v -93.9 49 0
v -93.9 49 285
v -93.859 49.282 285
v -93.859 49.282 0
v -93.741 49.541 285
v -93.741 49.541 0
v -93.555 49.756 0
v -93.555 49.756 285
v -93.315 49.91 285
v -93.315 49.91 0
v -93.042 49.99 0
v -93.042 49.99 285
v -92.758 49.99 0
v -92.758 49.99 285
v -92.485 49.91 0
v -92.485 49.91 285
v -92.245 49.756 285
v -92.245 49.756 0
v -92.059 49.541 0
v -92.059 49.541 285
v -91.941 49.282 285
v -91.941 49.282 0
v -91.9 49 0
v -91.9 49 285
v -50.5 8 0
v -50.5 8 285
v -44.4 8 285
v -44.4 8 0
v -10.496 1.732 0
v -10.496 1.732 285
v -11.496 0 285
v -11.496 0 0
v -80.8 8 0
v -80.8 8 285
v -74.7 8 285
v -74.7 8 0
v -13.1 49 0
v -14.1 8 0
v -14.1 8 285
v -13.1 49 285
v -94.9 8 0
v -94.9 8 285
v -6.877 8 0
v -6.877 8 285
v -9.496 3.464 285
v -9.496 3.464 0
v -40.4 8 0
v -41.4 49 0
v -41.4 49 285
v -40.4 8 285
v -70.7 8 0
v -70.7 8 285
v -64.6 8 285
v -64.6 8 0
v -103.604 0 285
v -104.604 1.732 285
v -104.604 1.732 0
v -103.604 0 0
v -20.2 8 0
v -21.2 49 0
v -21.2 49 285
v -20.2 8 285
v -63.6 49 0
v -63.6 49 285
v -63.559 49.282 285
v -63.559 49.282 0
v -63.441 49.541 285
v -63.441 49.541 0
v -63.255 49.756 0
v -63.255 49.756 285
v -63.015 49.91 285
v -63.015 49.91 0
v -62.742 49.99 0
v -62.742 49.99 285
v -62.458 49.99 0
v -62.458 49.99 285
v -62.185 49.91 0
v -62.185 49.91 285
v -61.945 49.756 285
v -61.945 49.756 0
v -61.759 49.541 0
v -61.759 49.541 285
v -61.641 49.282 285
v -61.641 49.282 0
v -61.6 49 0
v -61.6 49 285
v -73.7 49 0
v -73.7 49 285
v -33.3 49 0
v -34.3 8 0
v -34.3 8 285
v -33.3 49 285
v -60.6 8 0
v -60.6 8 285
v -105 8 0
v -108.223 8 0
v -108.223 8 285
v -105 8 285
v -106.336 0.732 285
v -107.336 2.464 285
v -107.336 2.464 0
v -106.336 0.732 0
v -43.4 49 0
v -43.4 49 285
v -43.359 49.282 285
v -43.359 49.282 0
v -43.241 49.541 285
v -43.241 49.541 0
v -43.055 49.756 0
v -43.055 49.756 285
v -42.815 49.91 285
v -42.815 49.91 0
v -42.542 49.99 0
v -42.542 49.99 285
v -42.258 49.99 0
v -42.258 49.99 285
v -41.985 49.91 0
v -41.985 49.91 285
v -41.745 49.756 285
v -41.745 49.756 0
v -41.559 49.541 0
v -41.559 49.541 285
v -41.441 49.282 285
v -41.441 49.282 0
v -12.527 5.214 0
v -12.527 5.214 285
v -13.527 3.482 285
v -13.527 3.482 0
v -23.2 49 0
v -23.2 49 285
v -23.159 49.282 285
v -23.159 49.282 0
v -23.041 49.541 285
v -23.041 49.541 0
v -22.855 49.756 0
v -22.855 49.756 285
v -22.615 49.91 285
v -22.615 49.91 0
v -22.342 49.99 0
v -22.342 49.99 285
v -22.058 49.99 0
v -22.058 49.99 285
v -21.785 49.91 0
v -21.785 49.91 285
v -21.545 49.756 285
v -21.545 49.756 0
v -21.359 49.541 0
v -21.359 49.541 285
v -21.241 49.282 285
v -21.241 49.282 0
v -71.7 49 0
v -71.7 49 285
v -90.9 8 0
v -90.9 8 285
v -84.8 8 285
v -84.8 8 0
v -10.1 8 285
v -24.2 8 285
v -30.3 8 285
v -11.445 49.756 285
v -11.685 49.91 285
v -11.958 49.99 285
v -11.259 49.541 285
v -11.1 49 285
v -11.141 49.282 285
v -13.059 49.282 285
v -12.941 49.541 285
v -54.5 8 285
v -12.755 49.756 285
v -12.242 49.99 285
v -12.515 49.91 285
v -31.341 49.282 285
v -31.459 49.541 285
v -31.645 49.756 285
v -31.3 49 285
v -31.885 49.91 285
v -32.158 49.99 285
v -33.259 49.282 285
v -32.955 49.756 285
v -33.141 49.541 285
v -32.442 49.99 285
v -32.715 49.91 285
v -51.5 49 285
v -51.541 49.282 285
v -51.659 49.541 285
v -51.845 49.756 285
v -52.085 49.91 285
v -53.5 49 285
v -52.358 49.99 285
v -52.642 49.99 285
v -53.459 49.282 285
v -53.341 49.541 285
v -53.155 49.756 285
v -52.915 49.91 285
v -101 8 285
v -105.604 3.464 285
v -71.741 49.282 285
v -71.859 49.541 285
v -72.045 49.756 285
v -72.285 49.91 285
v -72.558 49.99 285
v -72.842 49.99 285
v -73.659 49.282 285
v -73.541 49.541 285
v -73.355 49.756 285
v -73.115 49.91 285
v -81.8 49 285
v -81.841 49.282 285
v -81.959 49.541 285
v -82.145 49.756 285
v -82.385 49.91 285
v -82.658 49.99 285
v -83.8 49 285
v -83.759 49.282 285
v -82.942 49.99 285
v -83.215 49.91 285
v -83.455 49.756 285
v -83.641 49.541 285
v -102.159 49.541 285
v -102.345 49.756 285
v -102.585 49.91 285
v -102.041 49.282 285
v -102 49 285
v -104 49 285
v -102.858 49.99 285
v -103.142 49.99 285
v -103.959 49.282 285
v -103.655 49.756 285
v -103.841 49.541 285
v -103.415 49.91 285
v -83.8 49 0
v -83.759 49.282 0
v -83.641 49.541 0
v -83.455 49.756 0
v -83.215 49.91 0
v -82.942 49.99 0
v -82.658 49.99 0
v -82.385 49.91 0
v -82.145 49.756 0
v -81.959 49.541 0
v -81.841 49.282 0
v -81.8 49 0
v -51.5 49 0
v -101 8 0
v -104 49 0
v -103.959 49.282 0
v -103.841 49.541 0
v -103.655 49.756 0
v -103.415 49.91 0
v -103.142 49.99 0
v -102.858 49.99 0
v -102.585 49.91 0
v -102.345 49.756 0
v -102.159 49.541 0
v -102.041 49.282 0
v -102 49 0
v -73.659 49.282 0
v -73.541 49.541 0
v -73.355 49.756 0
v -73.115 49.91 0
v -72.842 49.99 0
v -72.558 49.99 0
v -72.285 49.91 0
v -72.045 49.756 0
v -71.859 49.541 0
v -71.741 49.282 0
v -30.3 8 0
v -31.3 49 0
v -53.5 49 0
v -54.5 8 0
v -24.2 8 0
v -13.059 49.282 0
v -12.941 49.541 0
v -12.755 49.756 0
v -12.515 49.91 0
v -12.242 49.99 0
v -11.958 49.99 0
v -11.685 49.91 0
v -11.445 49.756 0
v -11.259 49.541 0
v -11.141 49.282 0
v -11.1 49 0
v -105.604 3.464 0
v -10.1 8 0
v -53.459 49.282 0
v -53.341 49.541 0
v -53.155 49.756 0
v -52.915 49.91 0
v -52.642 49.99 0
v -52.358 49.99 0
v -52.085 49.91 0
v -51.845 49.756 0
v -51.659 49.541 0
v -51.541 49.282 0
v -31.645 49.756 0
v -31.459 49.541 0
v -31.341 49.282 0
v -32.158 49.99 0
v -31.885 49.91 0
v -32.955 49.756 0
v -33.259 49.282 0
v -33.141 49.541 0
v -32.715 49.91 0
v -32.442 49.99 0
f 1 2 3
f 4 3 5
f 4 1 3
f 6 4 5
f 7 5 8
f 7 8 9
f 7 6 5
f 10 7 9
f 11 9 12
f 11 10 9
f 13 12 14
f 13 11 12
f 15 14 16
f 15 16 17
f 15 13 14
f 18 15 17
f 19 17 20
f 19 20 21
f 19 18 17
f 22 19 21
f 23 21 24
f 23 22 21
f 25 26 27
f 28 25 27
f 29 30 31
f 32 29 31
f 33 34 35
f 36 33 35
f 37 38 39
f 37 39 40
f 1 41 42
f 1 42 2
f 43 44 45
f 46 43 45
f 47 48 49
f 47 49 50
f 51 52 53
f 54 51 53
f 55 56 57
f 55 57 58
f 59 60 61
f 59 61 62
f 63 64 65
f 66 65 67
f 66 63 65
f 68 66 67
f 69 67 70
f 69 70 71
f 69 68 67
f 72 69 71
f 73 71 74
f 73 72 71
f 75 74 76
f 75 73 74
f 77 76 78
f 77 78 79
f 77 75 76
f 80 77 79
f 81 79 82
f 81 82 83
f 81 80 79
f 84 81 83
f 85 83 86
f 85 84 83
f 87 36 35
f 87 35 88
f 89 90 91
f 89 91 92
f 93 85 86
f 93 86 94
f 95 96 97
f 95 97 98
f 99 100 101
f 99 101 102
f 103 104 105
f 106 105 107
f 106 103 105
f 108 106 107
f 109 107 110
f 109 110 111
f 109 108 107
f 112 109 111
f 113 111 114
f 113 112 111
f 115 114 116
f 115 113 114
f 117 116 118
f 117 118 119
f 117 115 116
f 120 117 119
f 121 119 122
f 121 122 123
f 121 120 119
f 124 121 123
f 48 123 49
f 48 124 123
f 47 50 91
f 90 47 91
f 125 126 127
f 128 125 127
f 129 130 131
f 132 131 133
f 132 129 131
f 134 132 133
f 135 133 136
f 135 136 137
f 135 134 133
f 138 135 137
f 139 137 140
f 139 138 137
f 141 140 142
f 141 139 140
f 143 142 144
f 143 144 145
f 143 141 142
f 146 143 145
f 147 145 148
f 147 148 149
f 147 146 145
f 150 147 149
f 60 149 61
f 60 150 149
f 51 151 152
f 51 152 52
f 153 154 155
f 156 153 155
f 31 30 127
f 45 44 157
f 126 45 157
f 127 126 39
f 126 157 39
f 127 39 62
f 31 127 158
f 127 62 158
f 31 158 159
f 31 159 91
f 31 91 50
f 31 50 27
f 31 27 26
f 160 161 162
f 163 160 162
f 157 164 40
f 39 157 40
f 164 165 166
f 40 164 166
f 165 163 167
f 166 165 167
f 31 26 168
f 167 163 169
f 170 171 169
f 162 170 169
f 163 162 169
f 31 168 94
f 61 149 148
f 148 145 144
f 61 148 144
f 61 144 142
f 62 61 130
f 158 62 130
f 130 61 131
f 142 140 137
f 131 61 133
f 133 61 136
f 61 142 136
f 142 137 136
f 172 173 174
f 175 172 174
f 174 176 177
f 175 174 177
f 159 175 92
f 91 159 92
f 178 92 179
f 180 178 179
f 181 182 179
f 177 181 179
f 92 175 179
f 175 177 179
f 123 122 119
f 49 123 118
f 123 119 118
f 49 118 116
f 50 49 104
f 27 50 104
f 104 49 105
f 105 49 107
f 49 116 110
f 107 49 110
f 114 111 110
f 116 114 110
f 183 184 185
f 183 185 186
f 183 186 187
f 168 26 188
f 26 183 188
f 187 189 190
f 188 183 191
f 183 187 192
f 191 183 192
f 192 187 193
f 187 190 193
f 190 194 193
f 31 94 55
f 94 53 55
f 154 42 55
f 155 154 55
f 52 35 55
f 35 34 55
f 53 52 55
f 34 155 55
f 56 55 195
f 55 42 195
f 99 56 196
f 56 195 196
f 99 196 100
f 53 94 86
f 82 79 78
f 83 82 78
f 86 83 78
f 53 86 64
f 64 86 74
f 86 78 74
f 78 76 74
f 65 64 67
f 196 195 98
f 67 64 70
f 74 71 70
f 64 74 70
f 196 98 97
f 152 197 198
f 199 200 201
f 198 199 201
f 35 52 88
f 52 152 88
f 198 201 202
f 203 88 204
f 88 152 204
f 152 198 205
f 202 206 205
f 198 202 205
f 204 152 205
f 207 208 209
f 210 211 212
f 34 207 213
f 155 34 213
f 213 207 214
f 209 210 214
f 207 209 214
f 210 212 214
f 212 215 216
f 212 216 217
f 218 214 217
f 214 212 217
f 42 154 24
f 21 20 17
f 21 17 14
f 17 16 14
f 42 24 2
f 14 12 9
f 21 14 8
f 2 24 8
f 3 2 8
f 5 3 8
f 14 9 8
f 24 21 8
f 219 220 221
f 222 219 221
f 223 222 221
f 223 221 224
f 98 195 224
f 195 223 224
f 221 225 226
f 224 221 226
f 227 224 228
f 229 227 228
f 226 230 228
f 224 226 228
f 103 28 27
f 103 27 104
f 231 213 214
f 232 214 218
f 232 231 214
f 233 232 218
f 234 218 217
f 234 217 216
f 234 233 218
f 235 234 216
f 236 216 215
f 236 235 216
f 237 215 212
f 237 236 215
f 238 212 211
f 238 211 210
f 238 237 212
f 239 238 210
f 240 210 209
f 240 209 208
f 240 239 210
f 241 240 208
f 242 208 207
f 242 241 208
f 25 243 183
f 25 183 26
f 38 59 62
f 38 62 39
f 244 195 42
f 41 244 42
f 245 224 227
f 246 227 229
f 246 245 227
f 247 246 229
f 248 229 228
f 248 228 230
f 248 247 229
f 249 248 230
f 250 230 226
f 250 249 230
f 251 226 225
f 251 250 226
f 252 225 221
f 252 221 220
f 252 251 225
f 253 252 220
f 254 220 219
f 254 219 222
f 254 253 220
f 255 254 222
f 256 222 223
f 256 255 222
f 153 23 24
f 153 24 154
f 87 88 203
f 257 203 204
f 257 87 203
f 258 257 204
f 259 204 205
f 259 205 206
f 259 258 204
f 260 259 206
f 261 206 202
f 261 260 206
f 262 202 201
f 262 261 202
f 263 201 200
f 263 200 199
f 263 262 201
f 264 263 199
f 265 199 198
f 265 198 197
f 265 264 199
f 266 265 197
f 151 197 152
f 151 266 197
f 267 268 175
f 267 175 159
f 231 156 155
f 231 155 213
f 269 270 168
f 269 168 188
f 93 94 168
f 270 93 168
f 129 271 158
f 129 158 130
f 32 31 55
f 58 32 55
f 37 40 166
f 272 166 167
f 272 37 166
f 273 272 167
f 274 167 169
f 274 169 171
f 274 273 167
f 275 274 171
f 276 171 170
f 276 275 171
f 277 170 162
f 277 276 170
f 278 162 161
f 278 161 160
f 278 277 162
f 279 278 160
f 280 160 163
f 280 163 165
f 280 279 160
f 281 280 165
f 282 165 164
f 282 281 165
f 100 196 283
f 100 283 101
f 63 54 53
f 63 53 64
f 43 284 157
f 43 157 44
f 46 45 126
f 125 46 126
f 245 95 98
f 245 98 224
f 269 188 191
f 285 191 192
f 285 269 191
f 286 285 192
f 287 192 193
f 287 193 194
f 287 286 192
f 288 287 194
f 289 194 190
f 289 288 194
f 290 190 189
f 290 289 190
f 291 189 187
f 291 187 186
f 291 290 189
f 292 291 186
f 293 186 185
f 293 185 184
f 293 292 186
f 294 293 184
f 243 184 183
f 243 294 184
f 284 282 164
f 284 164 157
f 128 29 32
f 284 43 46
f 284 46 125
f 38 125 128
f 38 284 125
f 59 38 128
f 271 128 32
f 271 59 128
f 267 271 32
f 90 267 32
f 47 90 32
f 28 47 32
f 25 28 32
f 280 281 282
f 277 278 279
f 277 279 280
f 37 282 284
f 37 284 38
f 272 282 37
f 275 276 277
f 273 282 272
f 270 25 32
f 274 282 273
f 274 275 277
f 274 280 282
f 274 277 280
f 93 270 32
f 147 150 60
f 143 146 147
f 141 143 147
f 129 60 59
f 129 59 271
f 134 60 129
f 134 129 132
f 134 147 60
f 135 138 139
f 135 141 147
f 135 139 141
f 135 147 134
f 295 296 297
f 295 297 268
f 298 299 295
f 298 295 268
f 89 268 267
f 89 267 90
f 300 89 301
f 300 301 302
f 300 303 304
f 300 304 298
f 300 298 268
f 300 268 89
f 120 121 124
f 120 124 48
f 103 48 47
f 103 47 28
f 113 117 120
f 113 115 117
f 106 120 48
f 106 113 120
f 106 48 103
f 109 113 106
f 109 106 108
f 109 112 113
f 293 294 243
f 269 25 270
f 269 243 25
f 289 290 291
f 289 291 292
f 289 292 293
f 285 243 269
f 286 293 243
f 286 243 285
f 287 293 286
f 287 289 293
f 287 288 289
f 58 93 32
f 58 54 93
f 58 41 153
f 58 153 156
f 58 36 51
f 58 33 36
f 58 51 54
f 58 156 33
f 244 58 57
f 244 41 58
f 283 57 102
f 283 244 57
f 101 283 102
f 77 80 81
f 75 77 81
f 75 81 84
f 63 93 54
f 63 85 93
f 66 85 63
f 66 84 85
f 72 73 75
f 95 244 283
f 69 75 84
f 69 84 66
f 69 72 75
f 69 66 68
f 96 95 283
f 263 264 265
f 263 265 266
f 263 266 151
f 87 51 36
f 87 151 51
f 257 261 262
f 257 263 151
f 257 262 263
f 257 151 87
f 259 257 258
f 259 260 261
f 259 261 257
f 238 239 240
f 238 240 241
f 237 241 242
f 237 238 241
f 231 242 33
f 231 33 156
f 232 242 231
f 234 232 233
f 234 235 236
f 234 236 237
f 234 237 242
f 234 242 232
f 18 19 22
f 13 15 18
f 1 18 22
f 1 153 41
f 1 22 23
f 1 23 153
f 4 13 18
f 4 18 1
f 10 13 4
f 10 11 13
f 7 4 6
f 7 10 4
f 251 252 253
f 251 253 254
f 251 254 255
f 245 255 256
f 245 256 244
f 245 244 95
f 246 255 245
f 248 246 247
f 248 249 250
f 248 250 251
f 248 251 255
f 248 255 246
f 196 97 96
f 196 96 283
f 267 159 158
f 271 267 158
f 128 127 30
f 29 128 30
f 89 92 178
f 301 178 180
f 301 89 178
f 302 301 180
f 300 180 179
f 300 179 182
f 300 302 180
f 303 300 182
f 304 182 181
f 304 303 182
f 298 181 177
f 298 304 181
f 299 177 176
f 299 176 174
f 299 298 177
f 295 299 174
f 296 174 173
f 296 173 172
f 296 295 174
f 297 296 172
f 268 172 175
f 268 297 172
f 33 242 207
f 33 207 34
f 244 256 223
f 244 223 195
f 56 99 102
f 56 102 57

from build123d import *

# Parameters (mm, degrees)
RESSALTO_EXTRUS_O1_DEPTH   = 285
CORTE_EXTRUS_O1_DEPTH      = 1
CORTE_EXTRUS_O1_DEPTH_BACK = 286


with BuildPart() as part:
    # Esboço1 → Ressalto-extrusão1 (new body)
    with BuildSketch(Plane.XY):
        with BuildLine():
            Line((0, 0), (-115.1, 0))
            Line((-115.1, 0), (-115.1, 8))
            Line((-115.1, 8), (-114.1, 49))
            ThreePointArc((-114.1, 49), (-113.1, 50), (-112.1, 49))
            Line((-112.1, 49), (-111.1, 8))
            Line((-111.1, 8), (-105, 8))
            Line((-105, 8), (-104, 49))
            ThreePointArc((-104, 49), (-103, 50), (-102, 49))
            Line((-102, 49), (-101, 8))
            Line((-101, 8), (-94.9, 8))
            Line((-94.9, 8), (-93.9, 49))
            ThreePointArc((-93.9, 49), (-92.9, 50), (-91.9, 49))
            Line((-91.9, 49), (-90.9, 8))
            Line((-90.9, 8), (-84.8, 8))
            Line((-84.8, 8), (-83.8, 49))
            ThreePointArc((-83.8, 49), (-82.8, 50), (-81.8, 49))
            Line((-81.8, 49), (-80.8, 8))
            Line((-80.8, 8), (-74.7, 8))
            Line((-74.7, 8), (-73.7, 49))
            ThreePointArc((-73.7, 49), (-72.7, 50), (-71.7, 49))
            Line((-71.7, 49), (-70.7, 8))
            Line((-70.7, 8), (-64.6, 8))
            Line((-64.6, 8), (-63.6, 49))
            ThreePointArc((-63.6, 49), (-62.6, 50), (-61.6, 49))
            Line((-61.6, 49), (-60.6, 8))
            Line((-60.6, 8), (-54.5, 8))
            Line((-54.5, 8), (-53.5, 49))
            ThreePointArc((-53.5, 49), (-52.5, 50), (-51.5, 49))
            Line((-51.5, 49), (-50.5, 8))
            Line((-50.5, 8), (-44.4, 8))
            Line((-44.4, 8), (-43.4, 49))
            ThreePointArc((-43.4, 49), (-42.4, 50), (-41.4, 49))
            Line((-41.4, 49), (-40.4, 8))
            Line((-40.4, 8), (-34.3, 8))
            Line((-34.3, 8), (-33.3, 49))
            ThreePointArc((-33.3, 49), (-32.3, 50), (-31.3, 49))
            Line((-31.3, 49), (-30.3, 8))
            Line((-30.3, 8), (-24.2, 8))
            Line((-24.2, 8), (-23.2, 49))
            ThreePointArc((-23.2, 49), (-22.2, 50), (-21.2, 49))
            Line((-21.2, 49), (-20.2, 8))
            Line((-20.2, 8), (-14.1, 8))
            Line((-14.1, 8), (-13.1, 49))
            ThreePointArc((-13.1, 49), (-12.1, 50), (-11.1, 49))
            Line((-11.1, 49), (-10.1, 8))
            Line((-10.1, 8), (-4, 8))
            Line((-4, 8), (-3, 49))
            ThreePointArc((-3, 49), (-2, 50), (-1, 49))
            Line((-1, 49), (0, 8))
            Line((0, 8), (0, 0))
        make_face()
    extrude(amount=RESSALTO_EXTRUS_O1_DEPTH)

    # Esboço2 → Corte-extrusão1 (cut, two sides)
    with BuildSketch(Plane.XY.offset(285)) as corte_extrus_o1_sk:
        Polygon((-11.496152423, 0), (0, 0), (0, 52.247610254), (-6.877350269, 52.247610254), (-6.877350269, 8), (-9.496152423, 3.464101615), (-12.527241336, 5.214101615), (-13.527241336, 3.482050808), (-10.496152423, 1.732050808), align=None)
        Polygon((-103.603847577, 0), (-116.981639653, 0), (-116.981639653, 53.433129288), (-108.222649731, 53.433129288), (-108.222649731, 8), (-105.603847577, 3.464101615), (-107.335898385, 2.464101615), (-106.335898385, 0.732050808), (-104.603847577, 1.732050808), align=None)
    extrude(amount=CORTE_EXTRUS_O1_DEPTH, mode=Mode.SUBTRACT)
    extrude(corte_extrus_o1_sk.sketch, amount=-CORTE_EXTRUS_O1_DEPTH_BACK, mode=Mode.SUBTRACT)


solid = part.part
